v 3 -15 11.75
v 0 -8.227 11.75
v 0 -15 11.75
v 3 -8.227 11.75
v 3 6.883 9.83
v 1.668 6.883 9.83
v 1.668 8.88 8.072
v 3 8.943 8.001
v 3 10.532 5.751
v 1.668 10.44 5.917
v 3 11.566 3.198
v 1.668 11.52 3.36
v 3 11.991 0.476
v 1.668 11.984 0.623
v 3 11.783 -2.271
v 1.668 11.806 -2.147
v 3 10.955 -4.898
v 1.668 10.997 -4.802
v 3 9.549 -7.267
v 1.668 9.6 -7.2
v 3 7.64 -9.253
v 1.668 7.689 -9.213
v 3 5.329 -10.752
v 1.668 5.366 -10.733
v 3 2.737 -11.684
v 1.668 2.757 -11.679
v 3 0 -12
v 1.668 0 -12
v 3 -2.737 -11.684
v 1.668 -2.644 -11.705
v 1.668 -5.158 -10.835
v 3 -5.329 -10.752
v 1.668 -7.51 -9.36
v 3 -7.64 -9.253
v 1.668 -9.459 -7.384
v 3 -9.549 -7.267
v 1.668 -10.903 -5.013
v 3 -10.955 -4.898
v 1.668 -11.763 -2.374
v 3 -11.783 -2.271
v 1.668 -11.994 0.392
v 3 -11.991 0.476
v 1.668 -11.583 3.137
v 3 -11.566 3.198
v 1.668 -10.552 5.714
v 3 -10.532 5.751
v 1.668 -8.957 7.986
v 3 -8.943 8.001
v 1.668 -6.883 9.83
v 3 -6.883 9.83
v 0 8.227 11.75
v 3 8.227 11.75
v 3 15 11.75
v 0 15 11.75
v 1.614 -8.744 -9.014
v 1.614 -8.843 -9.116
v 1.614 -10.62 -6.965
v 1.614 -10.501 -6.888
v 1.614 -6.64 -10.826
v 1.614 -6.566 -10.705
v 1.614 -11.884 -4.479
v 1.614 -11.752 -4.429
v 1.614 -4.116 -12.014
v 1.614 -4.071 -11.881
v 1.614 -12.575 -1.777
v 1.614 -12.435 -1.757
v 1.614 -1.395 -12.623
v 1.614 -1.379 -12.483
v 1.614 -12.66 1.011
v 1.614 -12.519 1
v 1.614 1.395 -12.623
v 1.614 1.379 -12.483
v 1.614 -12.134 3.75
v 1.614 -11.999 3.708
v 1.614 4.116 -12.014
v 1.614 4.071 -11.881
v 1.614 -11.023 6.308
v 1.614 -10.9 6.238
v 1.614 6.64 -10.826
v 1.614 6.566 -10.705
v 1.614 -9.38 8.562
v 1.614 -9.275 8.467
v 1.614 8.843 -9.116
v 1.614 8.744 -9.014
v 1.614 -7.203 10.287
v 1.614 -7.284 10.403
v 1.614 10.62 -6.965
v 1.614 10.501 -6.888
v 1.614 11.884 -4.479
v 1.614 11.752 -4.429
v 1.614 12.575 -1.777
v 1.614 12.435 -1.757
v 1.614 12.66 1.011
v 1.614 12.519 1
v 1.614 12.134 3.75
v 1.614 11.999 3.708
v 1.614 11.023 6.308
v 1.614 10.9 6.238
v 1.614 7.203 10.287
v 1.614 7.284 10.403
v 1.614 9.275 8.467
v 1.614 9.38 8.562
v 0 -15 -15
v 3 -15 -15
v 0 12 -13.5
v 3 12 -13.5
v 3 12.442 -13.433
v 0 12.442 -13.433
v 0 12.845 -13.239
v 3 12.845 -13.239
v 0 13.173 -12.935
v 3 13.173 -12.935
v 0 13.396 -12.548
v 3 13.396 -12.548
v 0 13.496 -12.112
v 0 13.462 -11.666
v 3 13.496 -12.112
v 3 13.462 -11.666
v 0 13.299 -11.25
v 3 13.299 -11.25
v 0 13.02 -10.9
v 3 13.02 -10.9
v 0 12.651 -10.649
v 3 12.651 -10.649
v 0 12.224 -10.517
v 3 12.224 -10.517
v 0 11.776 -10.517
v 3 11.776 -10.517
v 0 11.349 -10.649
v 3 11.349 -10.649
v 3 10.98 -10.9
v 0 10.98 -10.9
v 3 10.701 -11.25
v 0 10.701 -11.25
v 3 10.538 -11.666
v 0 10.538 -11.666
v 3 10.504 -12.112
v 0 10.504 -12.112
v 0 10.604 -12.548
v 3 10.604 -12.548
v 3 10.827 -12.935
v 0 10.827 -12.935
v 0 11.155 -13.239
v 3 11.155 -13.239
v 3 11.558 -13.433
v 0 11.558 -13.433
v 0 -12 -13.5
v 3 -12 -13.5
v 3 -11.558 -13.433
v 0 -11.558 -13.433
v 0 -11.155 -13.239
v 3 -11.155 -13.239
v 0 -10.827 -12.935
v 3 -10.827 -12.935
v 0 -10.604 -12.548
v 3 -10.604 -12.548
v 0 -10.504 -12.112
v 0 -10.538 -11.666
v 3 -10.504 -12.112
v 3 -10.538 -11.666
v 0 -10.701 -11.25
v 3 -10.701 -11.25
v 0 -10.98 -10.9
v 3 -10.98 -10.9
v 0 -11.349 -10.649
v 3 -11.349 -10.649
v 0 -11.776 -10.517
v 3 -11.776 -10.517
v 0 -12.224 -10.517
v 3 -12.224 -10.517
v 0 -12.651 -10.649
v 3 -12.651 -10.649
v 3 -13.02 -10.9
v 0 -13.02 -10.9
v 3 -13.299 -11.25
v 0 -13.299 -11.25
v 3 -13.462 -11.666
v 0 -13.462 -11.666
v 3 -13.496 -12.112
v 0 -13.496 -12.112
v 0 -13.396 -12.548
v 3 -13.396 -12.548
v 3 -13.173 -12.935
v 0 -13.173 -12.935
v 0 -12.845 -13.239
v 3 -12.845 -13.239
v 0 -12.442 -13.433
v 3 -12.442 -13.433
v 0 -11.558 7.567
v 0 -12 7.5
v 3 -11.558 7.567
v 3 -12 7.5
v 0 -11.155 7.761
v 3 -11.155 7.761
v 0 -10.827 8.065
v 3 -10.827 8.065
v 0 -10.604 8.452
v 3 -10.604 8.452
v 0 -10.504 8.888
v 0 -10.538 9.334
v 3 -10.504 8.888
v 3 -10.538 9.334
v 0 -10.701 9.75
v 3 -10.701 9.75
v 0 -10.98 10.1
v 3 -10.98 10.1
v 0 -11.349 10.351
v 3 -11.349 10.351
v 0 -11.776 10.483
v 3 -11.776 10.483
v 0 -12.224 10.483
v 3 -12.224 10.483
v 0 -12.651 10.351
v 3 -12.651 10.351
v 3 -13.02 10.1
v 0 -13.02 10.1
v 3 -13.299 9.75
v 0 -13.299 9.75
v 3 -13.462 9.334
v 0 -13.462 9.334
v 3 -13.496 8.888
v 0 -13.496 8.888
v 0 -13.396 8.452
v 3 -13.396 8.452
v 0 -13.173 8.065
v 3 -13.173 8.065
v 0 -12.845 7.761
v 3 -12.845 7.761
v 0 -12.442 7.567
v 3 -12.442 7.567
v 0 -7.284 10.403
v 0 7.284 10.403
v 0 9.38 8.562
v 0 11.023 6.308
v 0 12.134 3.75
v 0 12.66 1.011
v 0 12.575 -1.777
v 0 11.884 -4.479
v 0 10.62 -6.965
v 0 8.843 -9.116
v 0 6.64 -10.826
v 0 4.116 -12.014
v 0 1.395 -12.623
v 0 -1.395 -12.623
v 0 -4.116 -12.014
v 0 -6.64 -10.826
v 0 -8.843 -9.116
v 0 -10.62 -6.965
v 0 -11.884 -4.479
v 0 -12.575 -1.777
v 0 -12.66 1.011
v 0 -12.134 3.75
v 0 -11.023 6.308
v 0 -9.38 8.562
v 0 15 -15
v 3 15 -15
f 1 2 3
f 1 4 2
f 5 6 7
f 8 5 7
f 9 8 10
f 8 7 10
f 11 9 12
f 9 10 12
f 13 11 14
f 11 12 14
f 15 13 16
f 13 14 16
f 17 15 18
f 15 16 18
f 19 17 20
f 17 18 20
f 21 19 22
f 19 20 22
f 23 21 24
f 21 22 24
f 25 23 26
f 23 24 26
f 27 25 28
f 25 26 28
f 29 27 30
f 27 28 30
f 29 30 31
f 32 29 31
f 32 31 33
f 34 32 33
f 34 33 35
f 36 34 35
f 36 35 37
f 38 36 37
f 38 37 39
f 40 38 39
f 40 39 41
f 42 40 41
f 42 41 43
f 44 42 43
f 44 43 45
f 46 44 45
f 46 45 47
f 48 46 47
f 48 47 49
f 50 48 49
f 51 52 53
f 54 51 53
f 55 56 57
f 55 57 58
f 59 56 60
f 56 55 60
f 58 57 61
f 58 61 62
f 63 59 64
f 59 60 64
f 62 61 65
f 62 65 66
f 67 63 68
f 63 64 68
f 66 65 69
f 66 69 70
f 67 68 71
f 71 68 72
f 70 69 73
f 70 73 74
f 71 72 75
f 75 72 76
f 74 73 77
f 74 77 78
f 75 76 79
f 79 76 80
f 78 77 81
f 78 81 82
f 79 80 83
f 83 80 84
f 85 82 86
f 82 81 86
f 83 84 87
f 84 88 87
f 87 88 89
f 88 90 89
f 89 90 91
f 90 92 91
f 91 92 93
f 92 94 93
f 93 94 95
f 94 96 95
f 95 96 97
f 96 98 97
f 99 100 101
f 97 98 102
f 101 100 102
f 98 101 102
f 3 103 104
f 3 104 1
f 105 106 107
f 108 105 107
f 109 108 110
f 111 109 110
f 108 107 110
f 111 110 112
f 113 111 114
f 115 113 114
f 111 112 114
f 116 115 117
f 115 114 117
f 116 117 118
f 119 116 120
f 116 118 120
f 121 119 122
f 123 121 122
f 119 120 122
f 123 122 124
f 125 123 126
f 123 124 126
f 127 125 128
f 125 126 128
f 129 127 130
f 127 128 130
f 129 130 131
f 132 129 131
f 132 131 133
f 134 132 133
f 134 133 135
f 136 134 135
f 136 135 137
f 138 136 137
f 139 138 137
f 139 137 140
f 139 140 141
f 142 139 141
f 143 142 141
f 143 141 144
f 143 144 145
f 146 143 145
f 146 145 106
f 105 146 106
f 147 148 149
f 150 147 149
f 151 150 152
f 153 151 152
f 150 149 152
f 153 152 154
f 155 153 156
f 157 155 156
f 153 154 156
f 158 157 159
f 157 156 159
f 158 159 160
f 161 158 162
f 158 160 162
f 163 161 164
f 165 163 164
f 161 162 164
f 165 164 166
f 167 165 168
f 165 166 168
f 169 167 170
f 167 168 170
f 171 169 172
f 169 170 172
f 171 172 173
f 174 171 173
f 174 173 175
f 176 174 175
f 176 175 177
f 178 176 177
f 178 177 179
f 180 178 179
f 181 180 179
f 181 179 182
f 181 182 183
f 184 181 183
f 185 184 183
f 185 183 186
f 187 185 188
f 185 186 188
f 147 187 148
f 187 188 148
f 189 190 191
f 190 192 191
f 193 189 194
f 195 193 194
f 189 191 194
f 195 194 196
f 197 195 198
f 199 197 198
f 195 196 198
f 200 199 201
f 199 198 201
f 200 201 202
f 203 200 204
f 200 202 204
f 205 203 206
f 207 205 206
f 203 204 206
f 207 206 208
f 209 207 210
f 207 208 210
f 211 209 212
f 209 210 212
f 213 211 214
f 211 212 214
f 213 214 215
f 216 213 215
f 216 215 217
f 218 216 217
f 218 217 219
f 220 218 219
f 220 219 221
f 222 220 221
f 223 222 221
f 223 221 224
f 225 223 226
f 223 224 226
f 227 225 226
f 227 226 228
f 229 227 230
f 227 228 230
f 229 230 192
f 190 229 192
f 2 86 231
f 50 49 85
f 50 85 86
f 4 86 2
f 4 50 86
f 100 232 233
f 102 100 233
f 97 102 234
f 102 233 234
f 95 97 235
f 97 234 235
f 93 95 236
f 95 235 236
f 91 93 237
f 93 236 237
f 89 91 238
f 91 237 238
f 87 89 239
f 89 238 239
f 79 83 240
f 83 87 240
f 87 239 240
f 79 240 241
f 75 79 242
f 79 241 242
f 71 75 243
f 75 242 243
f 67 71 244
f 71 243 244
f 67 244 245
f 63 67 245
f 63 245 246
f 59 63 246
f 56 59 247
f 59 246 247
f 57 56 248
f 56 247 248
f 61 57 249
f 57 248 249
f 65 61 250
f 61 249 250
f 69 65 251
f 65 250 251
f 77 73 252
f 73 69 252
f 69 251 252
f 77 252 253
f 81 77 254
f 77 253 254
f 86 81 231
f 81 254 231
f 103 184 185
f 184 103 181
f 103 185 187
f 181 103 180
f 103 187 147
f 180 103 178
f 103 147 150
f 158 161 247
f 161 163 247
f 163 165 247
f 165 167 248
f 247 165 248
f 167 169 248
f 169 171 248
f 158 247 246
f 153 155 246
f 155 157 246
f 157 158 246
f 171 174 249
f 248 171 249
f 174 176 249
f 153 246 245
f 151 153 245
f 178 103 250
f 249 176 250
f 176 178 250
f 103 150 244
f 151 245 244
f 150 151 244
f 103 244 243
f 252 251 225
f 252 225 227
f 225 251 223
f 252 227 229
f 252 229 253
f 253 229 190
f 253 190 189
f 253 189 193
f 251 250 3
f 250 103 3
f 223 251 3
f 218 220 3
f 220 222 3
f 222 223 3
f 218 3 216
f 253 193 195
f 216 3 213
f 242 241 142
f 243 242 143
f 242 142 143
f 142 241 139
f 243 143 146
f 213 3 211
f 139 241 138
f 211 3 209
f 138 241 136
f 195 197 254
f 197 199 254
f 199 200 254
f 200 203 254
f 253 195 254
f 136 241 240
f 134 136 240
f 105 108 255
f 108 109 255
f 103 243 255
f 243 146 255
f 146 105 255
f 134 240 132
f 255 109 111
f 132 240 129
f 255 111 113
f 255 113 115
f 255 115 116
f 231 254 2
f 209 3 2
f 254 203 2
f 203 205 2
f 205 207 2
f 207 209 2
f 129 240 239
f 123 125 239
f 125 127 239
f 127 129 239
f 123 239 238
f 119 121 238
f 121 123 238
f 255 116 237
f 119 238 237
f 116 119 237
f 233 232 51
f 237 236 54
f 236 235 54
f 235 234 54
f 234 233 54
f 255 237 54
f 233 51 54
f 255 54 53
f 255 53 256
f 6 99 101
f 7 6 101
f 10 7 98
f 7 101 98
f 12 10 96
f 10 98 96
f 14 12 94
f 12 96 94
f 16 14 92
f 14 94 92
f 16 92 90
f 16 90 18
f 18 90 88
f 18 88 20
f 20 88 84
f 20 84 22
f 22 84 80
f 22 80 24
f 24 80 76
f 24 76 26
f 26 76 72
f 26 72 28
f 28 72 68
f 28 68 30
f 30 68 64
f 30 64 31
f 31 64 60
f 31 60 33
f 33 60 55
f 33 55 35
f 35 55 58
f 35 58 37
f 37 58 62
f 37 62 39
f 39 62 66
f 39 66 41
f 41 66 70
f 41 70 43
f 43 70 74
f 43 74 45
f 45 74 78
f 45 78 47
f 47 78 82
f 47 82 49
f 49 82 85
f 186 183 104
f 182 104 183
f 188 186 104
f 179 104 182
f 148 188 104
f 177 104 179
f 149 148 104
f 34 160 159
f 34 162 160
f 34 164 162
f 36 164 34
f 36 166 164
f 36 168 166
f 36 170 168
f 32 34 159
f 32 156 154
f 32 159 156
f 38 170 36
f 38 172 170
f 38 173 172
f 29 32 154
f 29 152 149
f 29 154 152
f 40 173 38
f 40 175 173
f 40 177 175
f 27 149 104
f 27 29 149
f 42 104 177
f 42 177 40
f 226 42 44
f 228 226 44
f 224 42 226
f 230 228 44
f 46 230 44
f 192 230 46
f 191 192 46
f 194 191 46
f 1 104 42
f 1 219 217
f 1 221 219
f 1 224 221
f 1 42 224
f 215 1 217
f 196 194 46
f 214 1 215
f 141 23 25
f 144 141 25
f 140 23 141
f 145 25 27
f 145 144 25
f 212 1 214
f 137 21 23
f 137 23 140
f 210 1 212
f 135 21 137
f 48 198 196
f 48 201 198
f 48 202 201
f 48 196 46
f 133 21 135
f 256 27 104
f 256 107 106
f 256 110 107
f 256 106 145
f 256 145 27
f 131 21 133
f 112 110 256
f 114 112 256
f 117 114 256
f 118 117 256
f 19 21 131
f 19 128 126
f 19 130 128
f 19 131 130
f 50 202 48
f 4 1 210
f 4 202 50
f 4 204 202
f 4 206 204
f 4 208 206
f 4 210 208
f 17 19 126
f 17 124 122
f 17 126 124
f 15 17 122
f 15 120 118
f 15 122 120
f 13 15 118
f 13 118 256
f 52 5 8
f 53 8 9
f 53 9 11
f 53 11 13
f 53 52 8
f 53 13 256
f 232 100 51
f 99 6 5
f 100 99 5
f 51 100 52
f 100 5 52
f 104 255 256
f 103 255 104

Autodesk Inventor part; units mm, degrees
ref_plane "YZ Plane" through (0, 0, 0) normal (1, 0, 0) x (0, 1, 0)
ref_plane "XZ Plane" through (0, 0, 0) normal (0, 1, 0) x (-1, 0, 0)
ref_plane "XY Plane" through (0, 0, 0) normal (0, 0, 1) x (1, 0, 0)
sketch "Sketch1" plane through (0, 0, 0) normal (1, 0, 0) x (0, 1, 0)
  line L0 (-15, 15) -> (15, 15)
  line L1 (15, 15) -> (15, -15)
  line L2 (15, -15) -> (-15, -15)
  line L3 (-15, -15) -> (-15, 15)
  line L4 (-15, 15) -> (15, -15) construction
  line L5 (15, 15) -> (-15, -15) construction
  point P0 (0, 0)
  dimension "d0" = 30
  dimension "d1" = 30
extrude "Extrusion1" add sketch "Sketch1" along normal blind 3
sketch "Sketch2" plane through (0, 0, 0) normal (1, 0, 0) x (0, 1, 0)
  circle A0 centre (0, 0) radius 12.7
  dimension "d4" = 25.4
extrude "Extrusion2" cut sketch "Sketch2" along normal blind 1.614
sketch "Sketch3" plane through (0, 0, 0) normal (-1, 0, 0) x (0, 0, 1)
  circle A0 centre (0, 0) radius 12
  dimension "d7" = 24
extrude "Extrusion3" cut sketch "Sketch3" against normal up to next
sketch "Sketch4" plane through (0, 0, 0) normal (0, 1, 0) x (-1, 0, 0)
  line L0 (-1.614, 12.7) -> (-1.614, -12.7) projected
  line L1 (-1.614, 0) -> (-1.614, -12.5586)
  line L2 (-2.2305, 0) -> (-1.614, 0)
  arc A0 (-2.2305, 0) -> (-1.614, -12.5586) centre (125.9995, 0) ccw
  point P0 (0, 0)
  dimension "d10" = 12.5586
  dimension "d11" = 256.46
revolve "Revolution1" cut sketch "Sketch4" angle 360 about axis through (2.2305, 0, 0) along (-1, 0, 0)
sketch "Sketch7" plane through (3, 0, 0) normal (1, 0, 0) x (0, 0, -1)
  circle A0 centre (12, 12) radius 1.5
  circle A1 centre (12, -12) radius 1.5
  circle A2 centre (-9, -12) radius 1.5
  line L0 (15, 15) -> (-15, 15) projected
  line L1 (15, -15) -> (15, 15) projected
  line L2 (-15, -15) -> (15, -15) projected
  line L3 (-15, 15) -> (-15, -15) projected
  point P0 (0, 0)
  dimension "d24" = 3
  dimension "d25" = 3
  dimension "d26" = 3
  dimension "d27" = 3
  dimension "d28" = 3
  dimension "d29" = 3
  dimension "d30" = 6
extrude "Extrusion6" cut sketch "Sketch7" against normal up to surface (3 mm away) contours A0 | A1 | A2
sketch "Sketch8" plane through (3, 0, 0) normal (1, 0, 0) x (0, 0, -1)
  line L0 (0, 0) -> (-15, 0) construction
  line L1 (-15, 15) -> (-15, -15) projected
  line L2 (0, 0) -> (-11.75, -8.2274)
  line L3 (-11.75, -8.2274) -> (-11.75, -15)
  line L4 (-15, -15) -> (15, -15) projected
  line L5 (-11.75, -15) -> (-15, -15)
  line L6 (-15, -15) -> (-15, 0)
  line L7 (-15, -15) -> (-15, 15)
  line L8 (0, 0) -> (-11.75, 8.2274)
  line L9 (-11.75, 8.2274) -> (-11.75, 15)
  line L10 (-15, 15) -> (15, 15)
  dimension "d33" = 3.25
  dimension "d34" = 35
extrude "Extrusion7" cut sketch "Sketch8" against normal up to surface (3 mm away)
properties part number "LargeLensHolderP2S1" material "Acetal Resin, Black"
